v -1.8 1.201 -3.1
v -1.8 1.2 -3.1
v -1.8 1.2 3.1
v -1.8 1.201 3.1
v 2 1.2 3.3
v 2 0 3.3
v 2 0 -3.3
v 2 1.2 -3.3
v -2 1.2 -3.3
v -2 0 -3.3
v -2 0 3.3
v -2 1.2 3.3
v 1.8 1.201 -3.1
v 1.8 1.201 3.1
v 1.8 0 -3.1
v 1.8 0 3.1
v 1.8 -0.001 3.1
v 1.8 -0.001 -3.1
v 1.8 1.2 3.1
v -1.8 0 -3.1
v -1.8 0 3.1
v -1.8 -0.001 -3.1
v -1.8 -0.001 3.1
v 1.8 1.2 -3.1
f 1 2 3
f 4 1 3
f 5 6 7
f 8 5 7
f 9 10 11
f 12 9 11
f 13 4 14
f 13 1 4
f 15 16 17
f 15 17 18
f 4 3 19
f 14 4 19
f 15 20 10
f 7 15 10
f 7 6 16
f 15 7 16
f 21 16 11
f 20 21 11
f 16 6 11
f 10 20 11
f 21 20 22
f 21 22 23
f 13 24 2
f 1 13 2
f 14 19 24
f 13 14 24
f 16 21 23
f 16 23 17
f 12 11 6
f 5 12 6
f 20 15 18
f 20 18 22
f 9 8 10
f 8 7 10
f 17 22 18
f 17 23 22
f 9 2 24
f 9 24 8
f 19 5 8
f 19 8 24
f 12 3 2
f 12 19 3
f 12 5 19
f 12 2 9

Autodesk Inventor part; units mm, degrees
ref_plane "YZ Plane" through (0, 0, 0) normal (1, 0, 0) x (0, 1, 0)
ref_plane "XZ Plane" through (0, 0, 0) normal (0, 1, 0) x (-1, 0, 0)
ref_plane "XY Plane" through (0, 0, 0) normal (0, 0, 1) x (1, 0, 0)
sketch "Sketch1" plane through (0, 0, 0) normal (0, 1, 0) x (-1, 0, 0)
  line L0 (2, 3.3) -> (-2, 3.3)
  line L1 (-2, 3.3) -> (-2, -3.3)
  line L2 (-2, -3.3) -> (2, -3.3)
  line L3 (2, -3.3) -> (2, 3.3)
  line L4 (2, 3.3) -> (-2, -3.3) construction
  line L5 (-2, 3.3) -> (2, -3.3) construction
  point P0 (0, 0)
  dimension "d0" = 4
  dimension "d1" = 6.6
extrude "Extrusion1" add sketch "Sketch1" along normal blind 1.2
sketch "Sketch2" plane through (0, 1.2, 0) normal (0, 1, 0) x (1, 0, 0)
  line L0 (-1.8, -3.1) -> (1.8, -3.1)
  line L1 (1.8, -3.1) -> (1.8, 3.1)
  line L2 (1.8, 3.1) -> (-1.8, 3.1)
  line L3 (-1.8, 3.1) -> (-1.8, -3.1)
  line L4 (-1.8, -3.1) -> (1.8, 3.1) construction
  line L5 (1.8, -3.1) -> (-1.8, 3.1) construction
  point P0 (0, 0)
  dimension "d4" = 3.6
  dimension "d5" = 6.2
extrude "Extrusion2" add sketch "Sketch2" along normal blind 0.001
sketch "Sketch3" plane through (0, 0, 0) normal (0, -1, 0) x (1, 0, 0)
  line L0 (1.8, -3.1) -> (-1.8, -3.1)
  line L1 (-1.8, -3.1) -> (-1.8, 3.1)
  line L2 (-1.8, 3.1) -> (1.8, 3.1)
  line L3 (1.8, 3.1) -> (1.8, -3.1)
  line L4 (1.8, -3.1) -> (-1.8, 3.1) construction
  line L5 (-1.8, -3.1) -> (1.8, 3.1) construction
  point P0 (0, 0)
  dimension "d8" = 3.6
  dimension "d9" = 6.2
extrude "Extrusion3" add sketch "Sketch3" along normal blind 0.001
properties part number "KTN_Chip_6p6mm_4mm_1p2mm_WithElectrodes"
